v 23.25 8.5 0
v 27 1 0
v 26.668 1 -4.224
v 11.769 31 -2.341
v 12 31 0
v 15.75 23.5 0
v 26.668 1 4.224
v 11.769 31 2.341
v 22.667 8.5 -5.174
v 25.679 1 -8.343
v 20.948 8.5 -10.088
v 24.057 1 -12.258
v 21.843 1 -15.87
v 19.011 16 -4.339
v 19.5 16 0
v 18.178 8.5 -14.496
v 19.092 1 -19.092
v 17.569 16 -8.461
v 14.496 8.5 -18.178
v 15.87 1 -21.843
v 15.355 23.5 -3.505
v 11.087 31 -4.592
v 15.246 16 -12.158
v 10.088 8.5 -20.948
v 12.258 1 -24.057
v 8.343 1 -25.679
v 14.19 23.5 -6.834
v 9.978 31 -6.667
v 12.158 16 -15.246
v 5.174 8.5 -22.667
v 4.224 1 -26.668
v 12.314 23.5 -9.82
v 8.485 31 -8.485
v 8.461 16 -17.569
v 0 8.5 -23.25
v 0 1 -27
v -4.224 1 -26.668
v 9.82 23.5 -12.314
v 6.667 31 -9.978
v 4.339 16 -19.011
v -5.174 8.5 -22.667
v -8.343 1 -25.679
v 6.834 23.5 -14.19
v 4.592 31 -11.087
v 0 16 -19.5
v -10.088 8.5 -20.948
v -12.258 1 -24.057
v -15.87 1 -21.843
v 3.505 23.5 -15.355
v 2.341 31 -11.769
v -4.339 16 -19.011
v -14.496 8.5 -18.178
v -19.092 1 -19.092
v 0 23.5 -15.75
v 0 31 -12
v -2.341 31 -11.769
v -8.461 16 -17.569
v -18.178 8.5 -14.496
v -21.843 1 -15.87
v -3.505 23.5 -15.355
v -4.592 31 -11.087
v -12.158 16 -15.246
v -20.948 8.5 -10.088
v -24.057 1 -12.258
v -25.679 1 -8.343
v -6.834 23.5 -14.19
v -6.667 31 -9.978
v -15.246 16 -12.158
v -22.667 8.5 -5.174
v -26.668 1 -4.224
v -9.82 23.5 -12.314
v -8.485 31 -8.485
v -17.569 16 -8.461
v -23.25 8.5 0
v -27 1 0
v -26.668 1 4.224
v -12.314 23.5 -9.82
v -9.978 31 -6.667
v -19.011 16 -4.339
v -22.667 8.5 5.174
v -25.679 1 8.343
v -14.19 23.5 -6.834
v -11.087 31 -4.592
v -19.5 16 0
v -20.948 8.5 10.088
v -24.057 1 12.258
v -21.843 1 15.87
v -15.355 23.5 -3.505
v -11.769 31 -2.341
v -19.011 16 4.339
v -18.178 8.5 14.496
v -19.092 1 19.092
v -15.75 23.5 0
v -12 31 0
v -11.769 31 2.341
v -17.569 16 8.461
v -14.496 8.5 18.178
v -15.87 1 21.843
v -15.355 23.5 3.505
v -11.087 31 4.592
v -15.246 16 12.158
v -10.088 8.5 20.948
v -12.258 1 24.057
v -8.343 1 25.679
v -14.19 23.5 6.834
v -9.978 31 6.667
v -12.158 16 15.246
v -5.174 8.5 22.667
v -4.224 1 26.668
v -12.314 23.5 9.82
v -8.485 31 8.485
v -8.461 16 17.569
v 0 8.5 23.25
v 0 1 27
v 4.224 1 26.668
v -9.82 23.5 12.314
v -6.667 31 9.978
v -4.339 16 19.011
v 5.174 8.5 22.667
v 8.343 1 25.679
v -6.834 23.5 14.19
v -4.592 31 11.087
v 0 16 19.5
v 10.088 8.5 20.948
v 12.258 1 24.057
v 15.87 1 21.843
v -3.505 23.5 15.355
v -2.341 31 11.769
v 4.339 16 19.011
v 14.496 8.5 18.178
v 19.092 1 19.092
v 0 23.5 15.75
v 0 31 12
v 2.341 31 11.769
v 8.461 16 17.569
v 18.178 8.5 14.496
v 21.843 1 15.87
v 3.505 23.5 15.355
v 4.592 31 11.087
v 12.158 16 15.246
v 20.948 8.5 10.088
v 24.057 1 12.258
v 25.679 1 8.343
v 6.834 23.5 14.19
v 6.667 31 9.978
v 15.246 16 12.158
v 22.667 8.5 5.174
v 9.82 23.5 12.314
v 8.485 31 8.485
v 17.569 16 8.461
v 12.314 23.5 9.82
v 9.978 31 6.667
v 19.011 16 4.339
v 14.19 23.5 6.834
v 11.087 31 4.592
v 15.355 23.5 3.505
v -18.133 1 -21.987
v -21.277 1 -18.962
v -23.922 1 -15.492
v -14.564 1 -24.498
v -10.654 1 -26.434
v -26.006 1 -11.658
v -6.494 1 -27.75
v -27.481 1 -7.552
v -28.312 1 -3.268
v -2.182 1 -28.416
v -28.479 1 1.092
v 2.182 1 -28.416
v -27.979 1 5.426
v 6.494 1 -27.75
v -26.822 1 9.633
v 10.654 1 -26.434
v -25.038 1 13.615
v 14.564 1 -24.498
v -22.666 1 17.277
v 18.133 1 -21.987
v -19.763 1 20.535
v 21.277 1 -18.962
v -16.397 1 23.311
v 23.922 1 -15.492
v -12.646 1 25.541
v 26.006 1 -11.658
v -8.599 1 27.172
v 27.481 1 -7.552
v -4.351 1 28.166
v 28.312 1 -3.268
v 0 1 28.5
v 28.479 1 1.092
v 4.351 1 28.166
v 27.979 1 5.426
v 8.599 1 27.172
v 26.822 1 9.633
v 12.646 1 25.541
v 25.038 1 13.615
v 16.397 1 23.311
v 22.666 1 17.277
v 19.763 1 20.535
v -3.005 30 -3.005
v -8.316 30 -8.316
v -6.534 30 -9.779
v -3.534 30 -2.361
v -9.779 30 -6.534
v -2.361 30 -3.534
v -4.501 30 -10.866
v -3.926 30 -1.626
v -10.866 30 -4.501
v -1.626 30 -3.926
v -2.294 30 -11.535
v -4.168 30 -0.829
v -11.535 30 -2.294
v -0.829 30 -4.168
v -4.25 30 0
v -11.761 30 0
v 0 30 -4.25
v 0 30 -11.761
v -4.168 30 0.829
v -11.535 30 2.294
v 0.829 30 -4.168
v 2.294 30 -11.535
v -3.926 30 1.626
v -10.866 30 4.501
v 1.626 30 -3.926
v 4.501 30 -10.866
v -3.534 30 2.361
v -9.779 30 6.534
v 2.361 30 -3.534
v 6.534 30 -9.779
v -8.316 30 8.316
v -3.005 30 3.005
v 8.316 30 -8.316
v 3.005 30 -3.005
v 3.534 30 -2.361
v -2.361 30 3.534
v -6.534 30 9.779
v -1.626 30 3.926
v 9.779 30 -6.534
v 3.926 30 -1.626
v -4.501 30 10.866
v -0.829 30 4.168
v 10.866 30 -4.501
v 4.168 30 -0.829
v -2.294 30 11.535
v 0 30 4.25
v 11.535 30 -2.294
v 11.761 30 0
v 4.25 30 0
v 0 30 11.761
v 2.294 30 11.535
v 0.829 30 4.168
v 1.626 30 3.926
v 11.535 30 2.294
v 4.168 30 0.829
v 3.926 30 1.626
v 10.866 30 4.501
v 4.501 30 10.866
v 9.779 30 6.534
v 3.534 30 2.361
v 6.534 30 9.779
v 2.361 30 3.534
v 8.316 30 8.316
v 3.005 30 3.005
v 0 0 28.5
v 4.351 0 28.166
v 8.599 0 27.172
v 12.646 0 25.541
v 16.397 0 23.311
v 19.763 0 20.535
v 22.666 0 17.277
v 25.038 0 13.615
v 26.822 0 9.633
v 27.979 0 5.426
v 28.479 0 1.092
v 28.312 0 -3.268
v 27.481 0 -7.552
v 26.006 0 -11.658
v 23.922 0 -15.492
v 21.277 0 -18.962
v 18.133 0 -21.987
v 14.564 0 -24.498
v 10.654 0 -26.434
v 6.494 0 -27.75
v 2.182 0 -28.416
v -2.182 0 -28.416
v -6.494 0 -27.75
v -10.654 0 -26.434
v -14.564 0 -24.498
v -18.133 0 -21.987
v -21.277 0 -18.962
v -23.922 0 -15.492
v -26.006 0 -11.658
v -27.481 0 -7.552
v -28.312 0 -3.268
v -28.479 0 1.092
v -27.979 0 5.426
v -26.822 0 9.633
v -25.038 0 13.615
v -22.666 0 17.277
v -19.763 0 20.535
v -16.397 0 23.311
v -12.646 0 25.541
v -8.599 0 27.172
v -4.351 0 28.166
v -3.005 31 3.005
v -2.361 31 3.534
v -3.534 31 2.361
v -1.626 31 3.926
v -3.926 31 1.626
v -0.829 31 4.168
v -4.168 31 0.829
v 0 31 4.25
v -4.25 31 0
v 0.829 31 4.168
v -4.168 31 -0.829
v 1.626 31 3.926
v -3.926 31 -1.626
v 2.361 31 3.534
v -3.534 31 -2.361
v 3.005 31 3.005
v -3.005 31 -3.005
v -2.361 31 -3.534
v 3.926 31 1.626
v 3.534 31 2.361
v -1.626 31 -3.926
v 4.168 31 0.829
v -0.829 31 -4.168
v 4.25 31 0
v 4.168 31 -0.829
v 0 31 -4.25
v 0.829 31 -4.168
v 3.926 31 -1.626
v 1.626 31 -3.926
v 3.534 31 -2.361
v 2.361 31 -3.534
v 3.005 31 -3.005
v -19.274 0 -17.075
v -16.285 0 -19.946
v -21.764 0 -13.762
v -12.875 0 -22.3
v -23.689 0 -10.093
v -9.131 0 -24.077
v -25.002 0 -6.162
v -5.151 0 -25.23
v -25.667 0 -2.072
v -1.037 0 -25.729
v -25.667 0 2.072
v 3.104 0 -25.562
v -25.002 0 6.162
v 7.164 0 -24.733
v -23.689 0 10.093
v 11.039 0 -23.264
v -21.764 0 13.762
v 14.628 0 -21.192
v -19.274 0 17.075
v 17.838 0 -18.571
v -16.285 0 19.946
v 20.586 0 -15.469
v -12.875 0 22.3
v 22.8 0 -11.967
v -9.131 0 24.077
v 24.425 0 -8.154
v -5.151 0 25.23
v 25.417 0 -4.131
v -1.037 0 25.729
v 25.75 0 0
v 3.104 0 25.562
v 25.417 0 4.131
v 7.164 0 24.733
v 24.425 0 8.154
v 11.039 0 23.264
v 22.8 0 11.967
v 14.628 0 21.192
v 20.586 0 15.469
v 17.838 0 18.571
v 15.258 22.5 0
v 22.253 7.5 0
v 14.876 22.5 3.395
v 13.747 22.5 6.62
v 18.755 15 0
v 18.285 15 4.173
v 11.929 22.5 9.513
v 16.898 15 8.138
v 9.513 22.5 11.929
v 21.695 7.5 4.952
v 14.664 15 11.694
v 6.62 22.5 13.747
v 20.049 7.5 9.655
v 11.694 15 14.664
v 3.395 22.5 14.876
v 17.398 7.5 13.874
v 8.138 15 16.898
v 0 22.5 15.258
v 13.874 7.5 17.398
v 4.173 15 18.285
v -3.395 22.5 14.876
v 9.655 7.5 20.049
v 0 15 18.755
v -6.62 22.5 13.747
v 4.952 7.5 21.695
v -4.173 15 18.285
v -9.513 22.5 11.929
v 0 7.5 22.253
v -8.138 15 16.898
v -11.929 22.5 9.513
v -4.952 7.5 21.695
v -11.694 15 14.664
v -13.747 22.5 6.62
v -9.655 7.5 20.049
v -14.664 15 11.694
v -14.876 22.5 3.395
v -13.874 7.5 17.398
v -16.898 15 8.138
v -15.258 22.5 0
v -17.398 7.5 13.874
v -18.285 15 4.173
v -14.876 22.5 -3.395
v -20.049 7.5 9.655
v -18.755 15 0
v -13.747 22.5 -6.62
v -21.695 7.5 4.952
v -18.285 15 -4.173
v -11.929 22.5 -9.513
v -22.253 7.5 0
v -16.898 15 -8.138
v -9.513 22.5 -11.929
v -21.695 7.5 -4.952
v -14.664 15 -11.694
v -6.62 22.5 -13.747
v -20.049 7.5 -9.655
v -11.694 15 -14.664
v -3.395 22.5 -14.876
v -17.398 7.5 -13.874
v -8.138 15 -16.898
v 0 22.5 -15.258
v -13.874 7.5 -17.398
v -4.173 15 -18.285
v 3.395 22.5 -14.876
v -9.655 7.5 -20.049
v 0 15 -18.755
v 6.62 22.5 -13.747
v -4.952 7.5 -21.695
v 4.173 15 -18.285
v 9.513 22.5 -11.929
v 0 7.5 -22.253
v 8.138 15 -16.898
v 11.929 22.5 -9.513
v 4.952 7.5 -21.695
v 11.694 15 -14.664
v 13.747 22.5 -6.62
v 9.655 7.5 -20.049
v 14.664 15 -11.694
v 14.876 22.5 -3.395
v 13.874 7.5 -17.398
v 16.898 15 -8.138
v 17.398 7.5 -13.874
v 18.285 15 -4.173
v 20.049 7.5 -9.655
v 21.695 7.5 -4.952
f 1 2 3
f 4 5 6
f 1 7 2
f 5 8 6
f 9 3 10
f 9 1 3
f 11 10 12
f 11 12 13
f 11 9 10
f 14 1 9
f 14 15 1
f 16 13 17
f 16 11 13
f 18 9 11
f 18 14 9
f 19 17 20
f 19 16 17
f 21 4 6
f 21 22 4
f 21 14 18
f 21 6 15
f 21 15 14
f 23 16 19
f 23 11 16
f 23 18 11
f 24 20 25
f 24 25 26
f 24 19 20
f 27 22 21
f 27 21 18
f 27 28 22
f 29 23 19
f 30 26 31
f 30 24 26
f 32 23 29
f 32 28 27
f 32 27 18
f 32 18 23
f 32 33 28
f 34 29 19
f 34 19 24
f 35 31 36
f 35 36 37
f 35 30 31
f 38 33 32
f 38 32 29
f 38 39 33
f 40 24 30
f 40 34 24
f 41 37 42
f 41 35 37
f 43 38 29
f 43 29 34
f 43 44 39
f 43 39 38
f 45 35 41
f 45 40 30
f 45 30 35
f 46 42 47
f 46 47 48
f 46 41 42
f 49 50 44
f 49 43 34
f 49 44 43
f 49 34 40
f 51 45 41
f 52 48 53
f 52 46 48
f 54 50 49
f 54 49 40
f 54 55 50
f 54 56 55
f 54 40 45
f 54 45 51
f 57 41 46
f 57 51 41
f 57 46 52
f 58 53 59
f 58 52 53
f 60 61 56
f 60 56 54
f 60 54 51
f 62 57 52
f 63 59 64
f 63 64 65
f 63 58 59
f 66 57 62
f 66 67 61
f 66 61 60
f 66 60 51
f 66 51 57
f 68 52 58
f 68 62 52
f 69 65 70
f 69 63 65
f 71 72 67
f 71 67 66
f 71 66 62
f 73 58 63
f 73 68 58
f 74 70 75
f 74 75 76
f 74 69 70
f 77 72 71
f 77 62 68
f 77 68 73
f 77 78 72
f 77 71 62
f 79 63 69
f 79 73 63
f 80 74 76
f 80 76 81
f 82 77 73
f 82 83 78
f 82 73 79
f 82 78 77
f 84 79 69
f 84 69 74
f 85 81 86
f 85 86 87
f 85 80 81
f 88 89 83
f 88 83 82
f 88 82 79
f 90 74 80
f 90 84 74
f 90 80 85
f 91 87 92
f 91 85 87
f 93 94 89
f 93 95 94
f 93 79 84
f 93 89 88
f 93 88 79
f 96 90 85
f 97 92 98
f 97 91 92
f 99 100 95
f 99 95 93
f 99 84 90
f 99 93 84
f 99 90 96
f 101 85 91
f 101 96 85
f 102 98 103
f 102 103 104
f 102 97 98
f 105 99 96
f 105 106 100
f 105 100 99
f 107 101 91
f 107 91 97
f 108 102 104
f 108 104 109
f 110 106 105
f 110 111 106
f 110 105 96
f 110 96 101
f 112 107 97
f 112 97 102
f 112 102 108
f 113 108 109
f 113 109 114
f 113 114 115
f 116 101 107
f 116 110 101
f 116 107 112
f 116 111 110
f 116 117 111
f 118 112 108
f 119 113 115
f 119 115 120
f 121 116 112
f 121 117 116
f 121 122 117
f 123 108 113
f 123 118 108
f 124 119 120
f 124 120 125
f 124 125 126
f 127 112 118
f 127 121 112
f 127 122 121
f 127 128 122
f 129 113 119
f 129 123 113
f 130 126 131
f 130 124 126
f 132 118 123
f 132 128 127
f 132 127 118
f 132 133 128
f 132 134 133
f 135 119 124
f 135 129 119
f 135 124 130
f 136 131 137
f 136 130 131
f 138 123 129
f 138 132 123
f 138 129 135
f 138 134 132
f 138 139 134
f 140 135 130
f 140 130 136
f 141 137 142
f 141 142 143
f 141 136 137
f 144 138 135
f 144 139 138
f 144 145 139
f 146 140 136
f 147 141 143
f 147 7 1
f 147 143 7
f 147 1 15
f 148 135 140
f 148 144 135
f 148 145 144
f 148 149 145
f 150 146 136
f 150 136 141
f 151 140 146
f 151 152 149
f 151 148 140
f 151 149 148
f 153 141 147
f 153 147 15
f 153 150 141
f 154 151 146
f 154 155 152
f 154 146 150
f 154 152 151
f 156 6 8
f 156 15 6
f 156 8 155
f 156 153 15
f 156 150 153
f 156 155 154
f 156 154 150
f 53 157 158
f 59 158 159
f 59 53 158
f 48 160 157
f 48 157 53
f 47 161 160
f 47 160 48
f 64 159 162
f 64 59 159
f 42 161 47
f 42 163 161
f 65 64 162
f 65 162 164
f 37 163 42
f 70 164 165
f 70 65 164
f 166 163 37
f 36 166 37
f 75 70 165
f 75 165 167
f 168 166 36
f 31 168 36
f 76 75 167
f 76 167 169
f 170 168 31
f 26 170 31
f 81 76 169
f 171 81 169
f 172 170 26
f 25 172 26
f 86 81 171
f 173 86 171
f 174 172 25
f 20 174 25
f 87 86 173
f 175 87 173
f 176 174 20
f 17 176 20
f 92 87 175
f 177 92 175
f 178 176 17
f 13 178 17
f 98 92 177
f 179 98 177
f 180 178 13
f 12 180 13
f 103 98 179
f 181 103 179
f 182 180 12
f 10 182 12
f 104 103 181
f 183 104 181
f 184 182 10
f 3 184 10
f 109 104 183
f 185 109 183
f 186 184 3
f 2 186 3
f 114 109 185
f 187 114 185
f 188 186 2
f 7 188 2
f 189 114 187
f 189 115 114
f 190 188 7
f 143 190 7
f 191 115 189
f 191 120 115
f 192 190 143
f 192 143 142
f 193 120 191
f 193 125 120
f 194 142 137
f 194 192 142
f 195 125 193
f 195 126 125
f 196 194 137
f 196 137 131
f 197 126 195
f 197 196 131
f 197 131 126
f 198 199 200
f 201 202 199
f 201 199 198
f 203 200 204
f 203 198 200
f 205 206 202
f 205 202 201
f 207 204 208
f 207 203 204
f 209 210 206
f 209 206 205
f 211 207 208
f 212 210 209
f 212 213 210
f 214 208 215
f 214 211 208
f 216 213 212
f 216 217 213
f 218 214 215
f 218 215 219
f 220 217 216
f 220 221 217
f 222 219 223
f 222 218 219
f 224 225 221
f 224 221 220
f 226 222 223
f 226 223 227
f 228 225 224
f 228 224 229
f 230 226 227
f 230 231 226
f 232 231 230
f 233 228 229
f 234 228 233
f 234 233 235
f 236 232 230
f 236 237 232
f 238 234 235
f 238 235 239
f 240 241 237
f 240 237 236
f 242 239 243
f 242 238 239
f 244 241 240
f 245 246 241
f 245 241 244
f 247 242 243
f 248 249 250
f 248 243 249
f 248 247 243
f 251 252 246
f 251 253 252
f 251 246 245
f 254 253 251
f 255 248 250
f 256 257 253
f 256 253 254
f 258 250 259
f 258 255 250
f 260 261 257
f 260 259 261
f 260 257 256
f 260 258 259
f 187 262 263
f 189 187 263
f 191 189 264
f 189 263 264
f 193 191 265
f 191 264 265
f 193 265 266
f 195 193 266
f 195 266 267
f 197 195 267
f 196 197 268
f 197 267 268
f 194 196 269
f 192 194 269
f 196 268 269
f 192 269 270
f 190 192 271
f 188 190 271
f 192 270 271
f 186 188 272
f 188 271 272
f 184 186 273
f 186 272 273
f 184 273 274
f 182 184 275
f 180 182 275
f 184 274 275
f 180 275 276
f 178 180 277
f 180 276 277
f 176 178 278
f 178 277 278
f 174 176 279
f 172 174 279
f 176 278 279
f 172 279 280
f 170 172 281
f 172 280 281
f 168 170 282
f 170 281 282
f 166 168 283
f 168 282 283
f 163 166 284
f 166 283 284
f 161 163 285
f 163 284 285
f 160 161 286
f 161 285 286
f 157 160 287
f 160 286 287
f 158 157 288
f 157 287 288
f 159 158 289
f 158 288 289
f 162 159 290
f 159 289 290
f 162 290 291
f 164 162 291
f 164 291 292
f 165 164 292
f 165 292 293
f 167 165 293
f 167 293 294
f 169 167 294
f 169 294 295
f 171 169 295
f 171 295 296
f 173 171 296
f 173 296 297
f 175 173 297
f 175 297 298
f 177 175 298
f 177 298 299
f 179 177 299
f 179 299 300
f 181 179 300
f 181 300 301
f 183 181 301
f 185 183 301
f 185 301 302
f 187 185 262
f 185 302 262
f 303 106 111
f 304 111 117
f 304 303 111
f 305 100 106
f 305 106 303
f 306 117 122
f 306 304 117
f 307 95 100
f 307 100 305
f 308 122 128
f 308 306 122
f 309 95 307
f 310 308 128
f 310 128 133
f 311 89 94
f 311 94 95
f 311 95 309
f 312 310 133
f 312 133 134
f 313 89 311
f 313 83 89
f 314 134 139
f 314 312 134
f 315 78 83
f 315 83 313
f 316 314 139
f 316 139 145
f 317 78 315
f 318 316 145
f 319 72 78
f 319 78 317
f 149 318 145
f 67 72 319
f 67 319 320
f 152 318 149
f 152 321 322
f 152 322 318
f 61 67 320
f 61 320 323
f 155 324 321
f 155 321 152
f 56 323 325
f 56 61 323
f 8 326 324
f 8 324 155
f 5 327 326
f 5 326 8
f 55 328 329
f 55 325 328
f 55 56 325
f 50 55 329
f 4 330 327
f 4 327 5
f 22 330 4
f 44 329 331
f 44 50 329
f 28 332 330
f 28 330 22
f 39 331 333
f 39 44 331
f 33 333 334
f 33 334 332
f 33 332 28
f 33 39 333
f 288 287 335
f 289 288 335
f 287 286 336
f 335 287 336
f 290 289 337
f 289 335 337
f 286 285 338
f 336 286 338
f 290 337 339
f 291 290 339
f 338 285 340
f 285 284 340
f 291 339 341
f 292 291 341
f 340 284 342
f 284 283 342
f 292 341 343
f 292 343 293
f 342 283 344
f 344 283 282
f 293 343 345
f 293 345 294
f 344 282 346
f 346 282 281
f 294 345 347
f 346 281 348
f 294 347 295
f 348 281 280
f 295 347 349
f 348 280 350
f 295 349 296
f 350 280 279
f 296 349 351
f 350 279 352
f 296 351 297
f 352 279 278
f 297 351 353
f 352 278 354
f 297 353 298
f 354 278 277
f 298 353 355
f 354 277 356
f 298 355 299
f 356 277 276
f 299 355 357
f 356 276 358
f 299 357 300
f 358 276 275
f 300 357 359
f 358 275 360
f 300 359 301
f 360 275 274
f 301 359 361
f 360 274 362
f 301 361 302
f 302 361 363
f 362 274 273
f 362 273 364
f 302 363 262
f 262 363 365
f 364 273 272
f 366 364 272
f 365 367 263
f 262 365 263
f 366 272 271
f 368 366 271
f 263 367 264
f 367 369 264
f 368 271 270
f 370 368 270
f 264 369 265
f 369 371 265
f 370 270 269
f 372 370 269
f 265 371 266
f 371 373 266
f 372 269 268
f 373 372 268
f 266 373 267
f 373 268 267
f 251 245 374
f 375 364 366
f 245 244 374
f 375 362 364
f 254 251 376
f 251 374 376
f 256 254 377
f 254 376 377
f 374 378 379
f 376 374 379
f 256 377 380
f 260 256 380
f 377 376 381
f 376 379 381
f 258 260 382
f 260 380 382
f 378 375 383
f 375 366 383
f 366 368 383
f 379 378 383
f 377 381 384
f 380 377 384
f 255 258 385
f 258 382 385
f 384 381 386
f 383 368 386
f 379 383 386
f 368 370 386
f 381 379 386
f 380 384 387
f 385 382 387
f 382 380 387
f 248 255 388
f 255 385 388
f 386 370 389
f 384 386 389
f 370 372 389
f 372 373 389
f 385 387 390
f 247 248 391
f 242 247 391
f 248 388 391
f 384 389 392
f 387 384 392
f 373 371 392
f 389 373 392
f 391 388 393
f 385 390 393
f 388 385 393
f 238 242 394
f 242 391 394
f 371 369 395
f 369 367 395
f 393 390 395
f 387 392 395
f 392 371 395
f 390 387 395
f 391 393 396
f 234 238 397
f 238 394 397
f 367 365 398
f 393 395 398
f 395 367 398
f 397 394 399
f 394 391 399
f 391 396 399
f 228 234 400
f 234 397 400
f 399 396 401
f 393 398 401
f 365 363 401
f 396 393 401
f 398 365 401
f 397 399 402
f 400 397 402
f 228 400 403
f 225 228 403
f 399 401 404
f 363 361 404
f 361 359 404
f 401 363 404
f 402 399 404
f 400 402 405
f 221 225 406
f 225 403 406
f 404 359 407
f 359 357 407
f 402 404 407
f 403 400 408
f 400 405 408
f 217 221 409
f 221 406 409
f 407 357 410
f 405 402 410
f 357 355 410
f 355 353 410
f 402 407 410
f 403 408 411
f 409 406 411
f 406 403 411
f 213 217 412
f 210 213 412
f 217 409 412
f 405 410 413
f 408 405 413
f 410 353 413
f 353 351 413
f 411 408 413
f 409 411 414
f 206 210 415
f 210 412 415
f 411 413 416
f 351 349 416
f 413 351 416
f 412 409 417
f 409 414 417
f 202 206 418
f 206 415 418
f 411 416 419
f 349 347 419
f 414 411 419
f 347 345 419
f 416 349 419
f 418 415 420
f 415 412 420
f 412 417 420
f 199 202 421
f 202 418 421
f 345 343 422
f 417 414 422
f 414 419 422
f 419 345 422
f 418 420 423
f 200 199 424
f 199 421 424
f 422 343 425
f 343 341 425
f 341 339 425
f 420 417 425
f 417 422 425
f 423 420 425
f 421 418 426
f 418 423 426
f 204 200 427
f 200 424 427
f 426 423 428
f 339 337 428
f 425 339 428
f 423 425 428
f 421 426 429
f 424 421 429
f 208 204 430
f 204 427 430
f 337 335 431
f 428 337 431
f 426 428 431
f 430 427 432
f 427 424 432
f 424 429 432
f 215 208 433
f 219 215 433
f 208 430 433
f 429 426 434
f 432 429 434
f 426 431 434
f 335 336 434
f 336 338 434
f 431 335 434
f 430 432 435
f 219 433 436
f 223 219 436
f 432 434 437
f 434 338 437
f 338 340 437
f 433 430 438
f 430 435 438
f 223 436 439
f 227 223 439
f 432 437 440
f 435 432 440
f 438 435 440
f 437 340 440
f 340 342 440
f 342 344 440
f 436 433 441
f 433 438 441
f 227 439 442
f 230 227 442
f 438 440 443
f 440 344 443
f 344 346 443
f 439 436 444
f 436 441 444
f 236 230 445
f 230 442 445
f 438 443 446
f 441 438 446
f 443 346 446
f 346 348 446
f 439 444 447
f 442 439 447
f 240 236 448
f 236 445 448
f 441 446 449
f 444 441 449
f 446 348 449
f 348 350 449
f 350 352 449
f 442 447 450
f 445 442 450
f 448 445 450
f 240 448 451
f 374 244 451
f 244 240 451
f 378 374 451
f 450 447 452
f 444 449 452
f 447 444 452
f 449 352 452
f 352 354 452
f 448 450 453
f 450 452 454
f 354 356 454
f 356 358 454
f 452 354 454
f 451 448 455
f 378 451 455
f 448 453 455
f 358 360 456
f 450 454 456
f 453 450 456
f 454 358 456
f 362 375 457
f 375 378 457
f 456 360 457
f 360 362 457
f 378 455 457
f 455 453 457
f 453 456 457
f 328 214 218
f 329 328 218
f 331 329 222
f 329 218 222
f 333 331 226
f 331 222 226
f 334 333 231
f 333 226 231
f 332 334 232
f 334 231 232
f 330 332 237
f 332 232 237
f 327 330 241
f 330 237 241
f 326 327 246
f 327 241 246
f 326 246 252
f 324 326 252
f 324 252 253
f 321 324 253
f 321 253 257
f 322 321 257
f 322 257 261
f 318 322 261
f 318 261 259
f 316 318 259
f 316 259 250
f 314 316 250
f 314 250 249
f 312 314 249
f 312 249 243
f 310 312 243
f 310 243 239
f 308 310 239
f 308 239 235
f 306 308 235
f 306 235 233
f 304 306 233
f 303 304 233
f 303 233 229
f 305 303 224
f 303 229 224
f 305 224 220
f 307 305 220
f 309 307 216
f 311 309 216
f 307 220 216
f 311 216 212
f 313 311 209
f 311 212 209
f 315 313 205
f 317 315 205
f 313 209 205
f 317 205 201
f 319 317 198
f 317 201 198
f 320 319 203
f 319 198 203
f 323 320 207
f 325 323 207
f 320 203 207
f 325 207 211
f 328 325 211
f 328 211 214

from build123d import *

# Parameters (mm, degrees)
SKETCH1_R           = 28.5
BOSS_EXTRUDE1_DEPTH = 1
SKETCH8_R           = 27
SKETCH3_R           = 12
SKETCH9_R           = 25.75
CUT_EXTRUDE1_DEPTH  = 30
CUT_EXTRUDE1_DRAFT  = -25
SKETCH10_R          = 4.25
CUT_EXTRUDE2_DEPTH  = 5


with BuildPart() as part:
    # Sketch1 → Boss-Extrude1 (new body)
    with BuildSketch(Plane(origin=(0, 0, 0), x_dir=(1, 0, 0), z_dir=(0, 1, 0))):
        with Locations(Location((0, 0, 0), (0, 0, 270))):
            Circle(SKETCH1_R)
    extrude(amount=BOSS_EXTRUDE1_DEPTH)

    # Sketch8 → Loft2 section 0
    with BuildSketch(Plane(origin=(0, 1, 0), x_dir=(1, 0, 0), z_dir=(0, 1, 0))):
        Circle(SKETCH8_R)
    # Sketch3 → Loft2 section 1
    with BuildSketch(Plane(origin=(0, 31, 0), x_dir=(1, 0, 0), z_dir=(0, 1, 0))):
        Circle(SKETCH3_R)
    loft()


with BuildPart() as cut_extrude1_tool:
    # Sketch9 → Cut-Extrude1 (with draft: the straight prism first)
    with BuildSketch(Plane.XZ):
        Circle(SKETCH9_R)
    extrude(amount=-CUT_EXTRUDE1_DEPTH)
    # Cut-Extrude1: the draft: its side faces are tilted about the plane it starts from
    cut_extrude1_sides = [cut_extrude1_tool.faces().sort_by_distance(p)[0] for p in [
        (-25.75, 15, 0),
    ]]
    draft(cut_extrude1_sides, Plane.XZ, CUT_EXTRUDE1_DRAFT)


with BuildPart() as part_1:
    add(part.part)

    # Cut-Extrude1: cut by cut_extrude1_tool
    add(cut_extrude1_tool.part, mode=Mode.SUBTRACT)

    # Sketch10 → Cut-Extrude2 (cut)
    with BuildSketch(Plane.XZ.offset(-30)):
        with Locations(Location((0, 0, 0), (0, 0, 270))):
            Circle(SKETCH10_R)
    extrude(amount=-CUT_EXTRUDE2_DEPTH, mode=Mode.SUBTRACT)


solid = part_1.part
